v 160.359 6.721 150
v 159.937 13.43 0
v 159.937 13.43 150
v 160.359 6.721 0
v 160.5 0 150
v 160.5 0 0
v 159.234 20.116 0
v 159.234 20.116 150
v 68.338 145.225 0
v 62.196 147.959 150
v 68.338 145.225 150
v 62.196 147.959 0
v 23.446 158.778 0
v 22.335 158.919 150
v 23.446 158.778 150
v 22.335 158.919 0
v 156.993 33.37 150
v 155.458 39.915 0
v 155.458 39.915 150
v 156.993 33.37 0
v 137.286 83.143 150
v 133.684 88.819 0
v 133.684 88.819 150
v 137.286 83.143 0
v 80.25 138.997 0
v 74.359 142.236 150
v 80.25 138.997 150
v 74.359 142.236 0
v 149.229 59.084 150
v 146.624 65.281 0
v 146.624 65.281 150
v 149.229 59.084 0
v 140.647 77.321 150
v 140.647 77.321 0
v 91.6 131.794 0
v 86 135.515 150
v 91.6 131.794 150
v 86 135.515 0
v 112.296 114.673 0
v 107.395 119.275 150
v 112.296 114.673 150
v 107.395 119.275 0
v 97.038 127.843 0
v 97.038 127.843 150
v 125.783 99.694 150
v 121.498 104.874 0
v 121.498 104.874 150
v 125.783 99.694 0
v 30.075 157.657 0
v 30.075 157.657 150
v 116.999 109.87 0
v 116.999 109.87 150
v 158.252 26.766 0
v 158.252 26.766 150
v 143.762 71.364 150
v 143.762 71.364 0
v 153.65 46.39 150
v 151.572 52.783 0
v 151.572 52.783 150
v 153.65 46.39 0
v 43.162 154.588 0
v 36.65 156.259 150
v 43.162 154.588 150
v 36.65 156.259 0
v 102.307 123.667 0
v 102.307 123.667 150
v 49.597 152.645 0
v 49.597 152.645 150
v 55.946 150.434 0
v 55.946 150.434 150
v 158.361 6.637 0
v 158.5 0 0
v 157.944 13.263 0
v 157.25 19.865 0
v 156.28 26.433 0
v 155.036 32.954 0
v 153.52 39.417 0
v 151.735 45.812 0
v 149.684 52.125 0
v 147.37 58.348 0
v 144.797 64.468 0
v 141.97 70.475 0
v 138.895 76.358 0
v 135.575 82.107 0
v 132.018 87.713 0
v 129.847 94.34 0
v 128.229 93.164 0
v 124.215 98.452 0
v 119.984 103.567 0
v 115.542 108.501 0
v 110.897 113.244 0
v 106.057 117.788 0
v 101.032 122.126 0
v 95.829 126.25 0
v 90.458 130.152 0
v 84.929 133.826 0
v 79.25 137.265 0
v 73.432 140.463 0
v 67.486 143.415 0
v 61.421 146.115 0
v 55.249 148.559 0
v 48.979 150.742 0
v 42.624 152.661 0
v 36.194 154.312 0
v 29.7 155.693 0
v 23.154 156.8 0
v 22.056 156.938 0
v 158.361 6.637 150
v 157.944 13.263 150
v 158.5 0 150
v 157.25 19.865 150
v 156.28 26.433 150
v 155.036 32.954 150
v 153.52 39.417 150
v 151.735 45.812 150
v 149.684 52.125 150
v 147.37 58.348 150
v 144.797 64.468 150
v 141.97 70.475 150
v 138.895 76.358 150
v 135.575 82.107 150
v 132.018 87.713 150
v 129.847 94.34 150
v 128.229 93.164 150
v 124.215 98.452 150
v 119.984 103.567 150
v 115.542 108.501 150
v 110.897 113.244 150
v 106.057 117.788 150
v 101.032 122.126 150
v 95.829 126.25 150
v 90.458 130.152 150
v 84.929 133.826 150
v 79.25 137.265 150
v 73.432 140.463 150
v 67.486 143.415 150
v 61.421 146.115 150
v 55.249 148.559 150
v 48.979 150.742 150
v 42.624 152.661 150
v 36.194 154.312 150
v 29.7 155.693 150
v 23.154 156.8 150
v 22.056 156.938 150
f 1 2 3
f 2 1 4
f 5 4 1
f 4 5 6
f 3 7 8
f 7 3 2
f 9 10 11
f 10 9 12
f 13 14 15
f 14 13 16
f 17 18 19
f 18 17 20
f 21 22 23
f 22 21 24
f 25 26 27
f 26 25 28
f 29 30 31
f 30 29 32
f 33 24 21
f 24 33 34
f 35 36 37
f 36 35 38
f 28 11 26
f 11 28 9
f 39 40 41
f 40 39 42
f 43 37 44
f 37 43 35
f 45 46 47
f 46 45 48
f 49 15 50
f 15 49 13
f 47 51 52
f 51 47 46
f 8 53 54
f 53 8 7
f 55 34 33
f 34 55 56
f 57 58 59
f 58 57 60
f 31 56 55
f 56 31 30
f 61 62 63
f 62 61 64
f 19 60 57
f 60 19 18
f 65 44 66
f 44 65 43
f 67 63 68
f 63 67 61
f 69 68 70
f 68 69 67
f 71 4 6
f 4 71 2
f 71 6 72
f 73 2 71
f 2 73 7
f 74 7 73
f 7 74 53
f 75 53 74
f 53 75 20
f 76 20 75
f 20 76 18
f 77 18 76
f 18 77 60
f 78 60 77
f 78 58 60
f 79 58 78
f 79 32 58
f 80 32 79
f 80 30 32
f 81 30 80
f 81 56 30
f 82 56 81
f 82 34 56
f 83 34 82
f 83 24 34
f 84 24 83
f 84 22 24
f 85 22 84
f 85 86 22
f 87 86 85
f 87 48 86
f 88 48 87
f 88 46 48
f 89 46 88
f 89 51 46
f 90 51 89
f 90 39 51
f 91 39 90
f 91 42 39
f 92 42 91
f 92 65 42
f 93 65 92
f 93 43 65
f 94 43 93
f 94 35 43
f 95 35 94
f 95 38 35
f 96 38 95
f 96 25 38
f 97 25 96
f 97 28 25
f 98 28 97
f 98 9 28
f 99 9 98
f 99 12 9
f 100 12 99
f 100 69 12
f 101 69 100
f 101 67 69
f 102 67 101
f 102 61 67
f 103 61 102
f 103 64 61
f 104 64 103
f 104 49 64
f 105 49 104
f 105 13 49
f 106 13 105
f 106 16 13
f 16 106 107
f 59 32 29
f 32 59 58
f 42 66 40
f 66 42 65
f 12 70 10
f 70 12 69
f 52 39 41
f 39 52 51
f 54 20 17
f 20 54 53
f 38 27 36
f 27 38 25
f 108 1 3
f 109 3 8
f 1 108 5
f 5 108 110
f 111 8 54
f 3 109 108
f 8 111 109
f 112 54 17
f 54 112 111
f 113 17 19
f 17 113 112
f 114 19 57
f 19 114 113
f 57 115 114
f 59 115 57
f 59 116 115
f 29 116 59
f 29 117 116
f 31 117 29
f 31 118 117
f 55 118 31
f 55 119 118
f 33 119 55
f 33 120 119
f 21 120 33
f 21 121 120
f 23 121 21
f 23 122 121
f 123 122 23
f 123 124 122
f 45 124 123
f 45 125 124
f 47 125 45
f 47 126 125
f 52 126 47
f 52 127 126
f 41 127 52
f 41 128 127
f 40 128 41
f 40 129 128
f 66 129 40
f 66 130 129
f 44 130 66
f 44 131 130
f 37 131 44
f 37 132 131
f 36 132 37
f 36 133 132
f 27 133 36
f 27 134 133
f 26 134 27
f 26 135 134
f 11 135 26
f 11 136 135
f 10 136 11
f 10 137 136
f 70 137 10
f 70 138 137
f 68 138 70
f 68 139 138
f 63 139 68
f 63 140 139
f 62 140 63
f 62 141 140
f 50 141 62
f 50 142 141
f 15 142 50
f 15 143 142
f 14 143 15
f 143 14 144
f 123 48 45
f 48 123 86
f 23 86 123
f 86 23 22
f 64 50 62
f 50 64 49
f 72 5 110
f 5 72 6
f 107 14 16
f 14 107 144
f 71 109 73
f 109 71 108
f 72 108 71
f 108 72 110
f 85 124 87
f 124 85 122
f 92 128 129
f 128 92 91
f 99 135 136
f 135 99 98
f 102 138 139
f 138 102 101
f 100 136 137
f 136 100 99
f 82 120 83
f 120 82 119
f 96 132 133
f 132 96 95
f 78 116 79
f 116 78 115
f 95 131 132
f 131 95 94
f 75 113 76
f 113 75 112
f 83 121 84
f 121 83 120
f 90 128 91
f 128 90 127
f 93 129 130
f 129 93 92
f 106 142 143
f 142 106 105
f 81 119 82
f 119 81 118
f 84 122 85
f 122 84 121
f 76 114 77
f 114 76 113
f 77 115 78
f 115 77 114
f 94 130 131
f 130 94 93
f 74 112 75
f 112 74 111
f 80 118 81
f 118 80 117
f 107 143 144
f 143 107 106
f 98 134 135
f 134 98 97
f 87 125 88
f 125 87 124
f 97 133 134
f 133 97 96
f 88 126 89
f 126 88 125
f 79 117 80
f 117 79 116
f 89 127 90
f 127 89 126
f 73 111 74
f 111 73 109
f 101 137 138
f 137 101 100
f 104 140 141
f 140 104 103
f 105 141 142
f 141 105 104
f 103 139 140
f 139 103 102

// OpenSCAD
BASE_RADIUS = 160.5;
BASE_ANGLE = 82;
BASE_THICKNESS = 2;
BASE_HEIGHT = 150;

$fn=150;

module pie_slice(r=3.0,a=30, h=10) {
  intersection() {
    cylinder(h, r, r);
    cube([r, r, r]);
    rotate([0, 0, a-90]) cube([r, r, r]);
  }
}

difference() {
    pie_slice(r=BASE_RADIUS, a=BASE_ANGLE, h=BASE_HEIGHT);
    pie_slice(r=BASE_RADIUS-BASE_THICKNESS, a=BASE_ANGLE+1, h=BASE_HEIGHT);
}
